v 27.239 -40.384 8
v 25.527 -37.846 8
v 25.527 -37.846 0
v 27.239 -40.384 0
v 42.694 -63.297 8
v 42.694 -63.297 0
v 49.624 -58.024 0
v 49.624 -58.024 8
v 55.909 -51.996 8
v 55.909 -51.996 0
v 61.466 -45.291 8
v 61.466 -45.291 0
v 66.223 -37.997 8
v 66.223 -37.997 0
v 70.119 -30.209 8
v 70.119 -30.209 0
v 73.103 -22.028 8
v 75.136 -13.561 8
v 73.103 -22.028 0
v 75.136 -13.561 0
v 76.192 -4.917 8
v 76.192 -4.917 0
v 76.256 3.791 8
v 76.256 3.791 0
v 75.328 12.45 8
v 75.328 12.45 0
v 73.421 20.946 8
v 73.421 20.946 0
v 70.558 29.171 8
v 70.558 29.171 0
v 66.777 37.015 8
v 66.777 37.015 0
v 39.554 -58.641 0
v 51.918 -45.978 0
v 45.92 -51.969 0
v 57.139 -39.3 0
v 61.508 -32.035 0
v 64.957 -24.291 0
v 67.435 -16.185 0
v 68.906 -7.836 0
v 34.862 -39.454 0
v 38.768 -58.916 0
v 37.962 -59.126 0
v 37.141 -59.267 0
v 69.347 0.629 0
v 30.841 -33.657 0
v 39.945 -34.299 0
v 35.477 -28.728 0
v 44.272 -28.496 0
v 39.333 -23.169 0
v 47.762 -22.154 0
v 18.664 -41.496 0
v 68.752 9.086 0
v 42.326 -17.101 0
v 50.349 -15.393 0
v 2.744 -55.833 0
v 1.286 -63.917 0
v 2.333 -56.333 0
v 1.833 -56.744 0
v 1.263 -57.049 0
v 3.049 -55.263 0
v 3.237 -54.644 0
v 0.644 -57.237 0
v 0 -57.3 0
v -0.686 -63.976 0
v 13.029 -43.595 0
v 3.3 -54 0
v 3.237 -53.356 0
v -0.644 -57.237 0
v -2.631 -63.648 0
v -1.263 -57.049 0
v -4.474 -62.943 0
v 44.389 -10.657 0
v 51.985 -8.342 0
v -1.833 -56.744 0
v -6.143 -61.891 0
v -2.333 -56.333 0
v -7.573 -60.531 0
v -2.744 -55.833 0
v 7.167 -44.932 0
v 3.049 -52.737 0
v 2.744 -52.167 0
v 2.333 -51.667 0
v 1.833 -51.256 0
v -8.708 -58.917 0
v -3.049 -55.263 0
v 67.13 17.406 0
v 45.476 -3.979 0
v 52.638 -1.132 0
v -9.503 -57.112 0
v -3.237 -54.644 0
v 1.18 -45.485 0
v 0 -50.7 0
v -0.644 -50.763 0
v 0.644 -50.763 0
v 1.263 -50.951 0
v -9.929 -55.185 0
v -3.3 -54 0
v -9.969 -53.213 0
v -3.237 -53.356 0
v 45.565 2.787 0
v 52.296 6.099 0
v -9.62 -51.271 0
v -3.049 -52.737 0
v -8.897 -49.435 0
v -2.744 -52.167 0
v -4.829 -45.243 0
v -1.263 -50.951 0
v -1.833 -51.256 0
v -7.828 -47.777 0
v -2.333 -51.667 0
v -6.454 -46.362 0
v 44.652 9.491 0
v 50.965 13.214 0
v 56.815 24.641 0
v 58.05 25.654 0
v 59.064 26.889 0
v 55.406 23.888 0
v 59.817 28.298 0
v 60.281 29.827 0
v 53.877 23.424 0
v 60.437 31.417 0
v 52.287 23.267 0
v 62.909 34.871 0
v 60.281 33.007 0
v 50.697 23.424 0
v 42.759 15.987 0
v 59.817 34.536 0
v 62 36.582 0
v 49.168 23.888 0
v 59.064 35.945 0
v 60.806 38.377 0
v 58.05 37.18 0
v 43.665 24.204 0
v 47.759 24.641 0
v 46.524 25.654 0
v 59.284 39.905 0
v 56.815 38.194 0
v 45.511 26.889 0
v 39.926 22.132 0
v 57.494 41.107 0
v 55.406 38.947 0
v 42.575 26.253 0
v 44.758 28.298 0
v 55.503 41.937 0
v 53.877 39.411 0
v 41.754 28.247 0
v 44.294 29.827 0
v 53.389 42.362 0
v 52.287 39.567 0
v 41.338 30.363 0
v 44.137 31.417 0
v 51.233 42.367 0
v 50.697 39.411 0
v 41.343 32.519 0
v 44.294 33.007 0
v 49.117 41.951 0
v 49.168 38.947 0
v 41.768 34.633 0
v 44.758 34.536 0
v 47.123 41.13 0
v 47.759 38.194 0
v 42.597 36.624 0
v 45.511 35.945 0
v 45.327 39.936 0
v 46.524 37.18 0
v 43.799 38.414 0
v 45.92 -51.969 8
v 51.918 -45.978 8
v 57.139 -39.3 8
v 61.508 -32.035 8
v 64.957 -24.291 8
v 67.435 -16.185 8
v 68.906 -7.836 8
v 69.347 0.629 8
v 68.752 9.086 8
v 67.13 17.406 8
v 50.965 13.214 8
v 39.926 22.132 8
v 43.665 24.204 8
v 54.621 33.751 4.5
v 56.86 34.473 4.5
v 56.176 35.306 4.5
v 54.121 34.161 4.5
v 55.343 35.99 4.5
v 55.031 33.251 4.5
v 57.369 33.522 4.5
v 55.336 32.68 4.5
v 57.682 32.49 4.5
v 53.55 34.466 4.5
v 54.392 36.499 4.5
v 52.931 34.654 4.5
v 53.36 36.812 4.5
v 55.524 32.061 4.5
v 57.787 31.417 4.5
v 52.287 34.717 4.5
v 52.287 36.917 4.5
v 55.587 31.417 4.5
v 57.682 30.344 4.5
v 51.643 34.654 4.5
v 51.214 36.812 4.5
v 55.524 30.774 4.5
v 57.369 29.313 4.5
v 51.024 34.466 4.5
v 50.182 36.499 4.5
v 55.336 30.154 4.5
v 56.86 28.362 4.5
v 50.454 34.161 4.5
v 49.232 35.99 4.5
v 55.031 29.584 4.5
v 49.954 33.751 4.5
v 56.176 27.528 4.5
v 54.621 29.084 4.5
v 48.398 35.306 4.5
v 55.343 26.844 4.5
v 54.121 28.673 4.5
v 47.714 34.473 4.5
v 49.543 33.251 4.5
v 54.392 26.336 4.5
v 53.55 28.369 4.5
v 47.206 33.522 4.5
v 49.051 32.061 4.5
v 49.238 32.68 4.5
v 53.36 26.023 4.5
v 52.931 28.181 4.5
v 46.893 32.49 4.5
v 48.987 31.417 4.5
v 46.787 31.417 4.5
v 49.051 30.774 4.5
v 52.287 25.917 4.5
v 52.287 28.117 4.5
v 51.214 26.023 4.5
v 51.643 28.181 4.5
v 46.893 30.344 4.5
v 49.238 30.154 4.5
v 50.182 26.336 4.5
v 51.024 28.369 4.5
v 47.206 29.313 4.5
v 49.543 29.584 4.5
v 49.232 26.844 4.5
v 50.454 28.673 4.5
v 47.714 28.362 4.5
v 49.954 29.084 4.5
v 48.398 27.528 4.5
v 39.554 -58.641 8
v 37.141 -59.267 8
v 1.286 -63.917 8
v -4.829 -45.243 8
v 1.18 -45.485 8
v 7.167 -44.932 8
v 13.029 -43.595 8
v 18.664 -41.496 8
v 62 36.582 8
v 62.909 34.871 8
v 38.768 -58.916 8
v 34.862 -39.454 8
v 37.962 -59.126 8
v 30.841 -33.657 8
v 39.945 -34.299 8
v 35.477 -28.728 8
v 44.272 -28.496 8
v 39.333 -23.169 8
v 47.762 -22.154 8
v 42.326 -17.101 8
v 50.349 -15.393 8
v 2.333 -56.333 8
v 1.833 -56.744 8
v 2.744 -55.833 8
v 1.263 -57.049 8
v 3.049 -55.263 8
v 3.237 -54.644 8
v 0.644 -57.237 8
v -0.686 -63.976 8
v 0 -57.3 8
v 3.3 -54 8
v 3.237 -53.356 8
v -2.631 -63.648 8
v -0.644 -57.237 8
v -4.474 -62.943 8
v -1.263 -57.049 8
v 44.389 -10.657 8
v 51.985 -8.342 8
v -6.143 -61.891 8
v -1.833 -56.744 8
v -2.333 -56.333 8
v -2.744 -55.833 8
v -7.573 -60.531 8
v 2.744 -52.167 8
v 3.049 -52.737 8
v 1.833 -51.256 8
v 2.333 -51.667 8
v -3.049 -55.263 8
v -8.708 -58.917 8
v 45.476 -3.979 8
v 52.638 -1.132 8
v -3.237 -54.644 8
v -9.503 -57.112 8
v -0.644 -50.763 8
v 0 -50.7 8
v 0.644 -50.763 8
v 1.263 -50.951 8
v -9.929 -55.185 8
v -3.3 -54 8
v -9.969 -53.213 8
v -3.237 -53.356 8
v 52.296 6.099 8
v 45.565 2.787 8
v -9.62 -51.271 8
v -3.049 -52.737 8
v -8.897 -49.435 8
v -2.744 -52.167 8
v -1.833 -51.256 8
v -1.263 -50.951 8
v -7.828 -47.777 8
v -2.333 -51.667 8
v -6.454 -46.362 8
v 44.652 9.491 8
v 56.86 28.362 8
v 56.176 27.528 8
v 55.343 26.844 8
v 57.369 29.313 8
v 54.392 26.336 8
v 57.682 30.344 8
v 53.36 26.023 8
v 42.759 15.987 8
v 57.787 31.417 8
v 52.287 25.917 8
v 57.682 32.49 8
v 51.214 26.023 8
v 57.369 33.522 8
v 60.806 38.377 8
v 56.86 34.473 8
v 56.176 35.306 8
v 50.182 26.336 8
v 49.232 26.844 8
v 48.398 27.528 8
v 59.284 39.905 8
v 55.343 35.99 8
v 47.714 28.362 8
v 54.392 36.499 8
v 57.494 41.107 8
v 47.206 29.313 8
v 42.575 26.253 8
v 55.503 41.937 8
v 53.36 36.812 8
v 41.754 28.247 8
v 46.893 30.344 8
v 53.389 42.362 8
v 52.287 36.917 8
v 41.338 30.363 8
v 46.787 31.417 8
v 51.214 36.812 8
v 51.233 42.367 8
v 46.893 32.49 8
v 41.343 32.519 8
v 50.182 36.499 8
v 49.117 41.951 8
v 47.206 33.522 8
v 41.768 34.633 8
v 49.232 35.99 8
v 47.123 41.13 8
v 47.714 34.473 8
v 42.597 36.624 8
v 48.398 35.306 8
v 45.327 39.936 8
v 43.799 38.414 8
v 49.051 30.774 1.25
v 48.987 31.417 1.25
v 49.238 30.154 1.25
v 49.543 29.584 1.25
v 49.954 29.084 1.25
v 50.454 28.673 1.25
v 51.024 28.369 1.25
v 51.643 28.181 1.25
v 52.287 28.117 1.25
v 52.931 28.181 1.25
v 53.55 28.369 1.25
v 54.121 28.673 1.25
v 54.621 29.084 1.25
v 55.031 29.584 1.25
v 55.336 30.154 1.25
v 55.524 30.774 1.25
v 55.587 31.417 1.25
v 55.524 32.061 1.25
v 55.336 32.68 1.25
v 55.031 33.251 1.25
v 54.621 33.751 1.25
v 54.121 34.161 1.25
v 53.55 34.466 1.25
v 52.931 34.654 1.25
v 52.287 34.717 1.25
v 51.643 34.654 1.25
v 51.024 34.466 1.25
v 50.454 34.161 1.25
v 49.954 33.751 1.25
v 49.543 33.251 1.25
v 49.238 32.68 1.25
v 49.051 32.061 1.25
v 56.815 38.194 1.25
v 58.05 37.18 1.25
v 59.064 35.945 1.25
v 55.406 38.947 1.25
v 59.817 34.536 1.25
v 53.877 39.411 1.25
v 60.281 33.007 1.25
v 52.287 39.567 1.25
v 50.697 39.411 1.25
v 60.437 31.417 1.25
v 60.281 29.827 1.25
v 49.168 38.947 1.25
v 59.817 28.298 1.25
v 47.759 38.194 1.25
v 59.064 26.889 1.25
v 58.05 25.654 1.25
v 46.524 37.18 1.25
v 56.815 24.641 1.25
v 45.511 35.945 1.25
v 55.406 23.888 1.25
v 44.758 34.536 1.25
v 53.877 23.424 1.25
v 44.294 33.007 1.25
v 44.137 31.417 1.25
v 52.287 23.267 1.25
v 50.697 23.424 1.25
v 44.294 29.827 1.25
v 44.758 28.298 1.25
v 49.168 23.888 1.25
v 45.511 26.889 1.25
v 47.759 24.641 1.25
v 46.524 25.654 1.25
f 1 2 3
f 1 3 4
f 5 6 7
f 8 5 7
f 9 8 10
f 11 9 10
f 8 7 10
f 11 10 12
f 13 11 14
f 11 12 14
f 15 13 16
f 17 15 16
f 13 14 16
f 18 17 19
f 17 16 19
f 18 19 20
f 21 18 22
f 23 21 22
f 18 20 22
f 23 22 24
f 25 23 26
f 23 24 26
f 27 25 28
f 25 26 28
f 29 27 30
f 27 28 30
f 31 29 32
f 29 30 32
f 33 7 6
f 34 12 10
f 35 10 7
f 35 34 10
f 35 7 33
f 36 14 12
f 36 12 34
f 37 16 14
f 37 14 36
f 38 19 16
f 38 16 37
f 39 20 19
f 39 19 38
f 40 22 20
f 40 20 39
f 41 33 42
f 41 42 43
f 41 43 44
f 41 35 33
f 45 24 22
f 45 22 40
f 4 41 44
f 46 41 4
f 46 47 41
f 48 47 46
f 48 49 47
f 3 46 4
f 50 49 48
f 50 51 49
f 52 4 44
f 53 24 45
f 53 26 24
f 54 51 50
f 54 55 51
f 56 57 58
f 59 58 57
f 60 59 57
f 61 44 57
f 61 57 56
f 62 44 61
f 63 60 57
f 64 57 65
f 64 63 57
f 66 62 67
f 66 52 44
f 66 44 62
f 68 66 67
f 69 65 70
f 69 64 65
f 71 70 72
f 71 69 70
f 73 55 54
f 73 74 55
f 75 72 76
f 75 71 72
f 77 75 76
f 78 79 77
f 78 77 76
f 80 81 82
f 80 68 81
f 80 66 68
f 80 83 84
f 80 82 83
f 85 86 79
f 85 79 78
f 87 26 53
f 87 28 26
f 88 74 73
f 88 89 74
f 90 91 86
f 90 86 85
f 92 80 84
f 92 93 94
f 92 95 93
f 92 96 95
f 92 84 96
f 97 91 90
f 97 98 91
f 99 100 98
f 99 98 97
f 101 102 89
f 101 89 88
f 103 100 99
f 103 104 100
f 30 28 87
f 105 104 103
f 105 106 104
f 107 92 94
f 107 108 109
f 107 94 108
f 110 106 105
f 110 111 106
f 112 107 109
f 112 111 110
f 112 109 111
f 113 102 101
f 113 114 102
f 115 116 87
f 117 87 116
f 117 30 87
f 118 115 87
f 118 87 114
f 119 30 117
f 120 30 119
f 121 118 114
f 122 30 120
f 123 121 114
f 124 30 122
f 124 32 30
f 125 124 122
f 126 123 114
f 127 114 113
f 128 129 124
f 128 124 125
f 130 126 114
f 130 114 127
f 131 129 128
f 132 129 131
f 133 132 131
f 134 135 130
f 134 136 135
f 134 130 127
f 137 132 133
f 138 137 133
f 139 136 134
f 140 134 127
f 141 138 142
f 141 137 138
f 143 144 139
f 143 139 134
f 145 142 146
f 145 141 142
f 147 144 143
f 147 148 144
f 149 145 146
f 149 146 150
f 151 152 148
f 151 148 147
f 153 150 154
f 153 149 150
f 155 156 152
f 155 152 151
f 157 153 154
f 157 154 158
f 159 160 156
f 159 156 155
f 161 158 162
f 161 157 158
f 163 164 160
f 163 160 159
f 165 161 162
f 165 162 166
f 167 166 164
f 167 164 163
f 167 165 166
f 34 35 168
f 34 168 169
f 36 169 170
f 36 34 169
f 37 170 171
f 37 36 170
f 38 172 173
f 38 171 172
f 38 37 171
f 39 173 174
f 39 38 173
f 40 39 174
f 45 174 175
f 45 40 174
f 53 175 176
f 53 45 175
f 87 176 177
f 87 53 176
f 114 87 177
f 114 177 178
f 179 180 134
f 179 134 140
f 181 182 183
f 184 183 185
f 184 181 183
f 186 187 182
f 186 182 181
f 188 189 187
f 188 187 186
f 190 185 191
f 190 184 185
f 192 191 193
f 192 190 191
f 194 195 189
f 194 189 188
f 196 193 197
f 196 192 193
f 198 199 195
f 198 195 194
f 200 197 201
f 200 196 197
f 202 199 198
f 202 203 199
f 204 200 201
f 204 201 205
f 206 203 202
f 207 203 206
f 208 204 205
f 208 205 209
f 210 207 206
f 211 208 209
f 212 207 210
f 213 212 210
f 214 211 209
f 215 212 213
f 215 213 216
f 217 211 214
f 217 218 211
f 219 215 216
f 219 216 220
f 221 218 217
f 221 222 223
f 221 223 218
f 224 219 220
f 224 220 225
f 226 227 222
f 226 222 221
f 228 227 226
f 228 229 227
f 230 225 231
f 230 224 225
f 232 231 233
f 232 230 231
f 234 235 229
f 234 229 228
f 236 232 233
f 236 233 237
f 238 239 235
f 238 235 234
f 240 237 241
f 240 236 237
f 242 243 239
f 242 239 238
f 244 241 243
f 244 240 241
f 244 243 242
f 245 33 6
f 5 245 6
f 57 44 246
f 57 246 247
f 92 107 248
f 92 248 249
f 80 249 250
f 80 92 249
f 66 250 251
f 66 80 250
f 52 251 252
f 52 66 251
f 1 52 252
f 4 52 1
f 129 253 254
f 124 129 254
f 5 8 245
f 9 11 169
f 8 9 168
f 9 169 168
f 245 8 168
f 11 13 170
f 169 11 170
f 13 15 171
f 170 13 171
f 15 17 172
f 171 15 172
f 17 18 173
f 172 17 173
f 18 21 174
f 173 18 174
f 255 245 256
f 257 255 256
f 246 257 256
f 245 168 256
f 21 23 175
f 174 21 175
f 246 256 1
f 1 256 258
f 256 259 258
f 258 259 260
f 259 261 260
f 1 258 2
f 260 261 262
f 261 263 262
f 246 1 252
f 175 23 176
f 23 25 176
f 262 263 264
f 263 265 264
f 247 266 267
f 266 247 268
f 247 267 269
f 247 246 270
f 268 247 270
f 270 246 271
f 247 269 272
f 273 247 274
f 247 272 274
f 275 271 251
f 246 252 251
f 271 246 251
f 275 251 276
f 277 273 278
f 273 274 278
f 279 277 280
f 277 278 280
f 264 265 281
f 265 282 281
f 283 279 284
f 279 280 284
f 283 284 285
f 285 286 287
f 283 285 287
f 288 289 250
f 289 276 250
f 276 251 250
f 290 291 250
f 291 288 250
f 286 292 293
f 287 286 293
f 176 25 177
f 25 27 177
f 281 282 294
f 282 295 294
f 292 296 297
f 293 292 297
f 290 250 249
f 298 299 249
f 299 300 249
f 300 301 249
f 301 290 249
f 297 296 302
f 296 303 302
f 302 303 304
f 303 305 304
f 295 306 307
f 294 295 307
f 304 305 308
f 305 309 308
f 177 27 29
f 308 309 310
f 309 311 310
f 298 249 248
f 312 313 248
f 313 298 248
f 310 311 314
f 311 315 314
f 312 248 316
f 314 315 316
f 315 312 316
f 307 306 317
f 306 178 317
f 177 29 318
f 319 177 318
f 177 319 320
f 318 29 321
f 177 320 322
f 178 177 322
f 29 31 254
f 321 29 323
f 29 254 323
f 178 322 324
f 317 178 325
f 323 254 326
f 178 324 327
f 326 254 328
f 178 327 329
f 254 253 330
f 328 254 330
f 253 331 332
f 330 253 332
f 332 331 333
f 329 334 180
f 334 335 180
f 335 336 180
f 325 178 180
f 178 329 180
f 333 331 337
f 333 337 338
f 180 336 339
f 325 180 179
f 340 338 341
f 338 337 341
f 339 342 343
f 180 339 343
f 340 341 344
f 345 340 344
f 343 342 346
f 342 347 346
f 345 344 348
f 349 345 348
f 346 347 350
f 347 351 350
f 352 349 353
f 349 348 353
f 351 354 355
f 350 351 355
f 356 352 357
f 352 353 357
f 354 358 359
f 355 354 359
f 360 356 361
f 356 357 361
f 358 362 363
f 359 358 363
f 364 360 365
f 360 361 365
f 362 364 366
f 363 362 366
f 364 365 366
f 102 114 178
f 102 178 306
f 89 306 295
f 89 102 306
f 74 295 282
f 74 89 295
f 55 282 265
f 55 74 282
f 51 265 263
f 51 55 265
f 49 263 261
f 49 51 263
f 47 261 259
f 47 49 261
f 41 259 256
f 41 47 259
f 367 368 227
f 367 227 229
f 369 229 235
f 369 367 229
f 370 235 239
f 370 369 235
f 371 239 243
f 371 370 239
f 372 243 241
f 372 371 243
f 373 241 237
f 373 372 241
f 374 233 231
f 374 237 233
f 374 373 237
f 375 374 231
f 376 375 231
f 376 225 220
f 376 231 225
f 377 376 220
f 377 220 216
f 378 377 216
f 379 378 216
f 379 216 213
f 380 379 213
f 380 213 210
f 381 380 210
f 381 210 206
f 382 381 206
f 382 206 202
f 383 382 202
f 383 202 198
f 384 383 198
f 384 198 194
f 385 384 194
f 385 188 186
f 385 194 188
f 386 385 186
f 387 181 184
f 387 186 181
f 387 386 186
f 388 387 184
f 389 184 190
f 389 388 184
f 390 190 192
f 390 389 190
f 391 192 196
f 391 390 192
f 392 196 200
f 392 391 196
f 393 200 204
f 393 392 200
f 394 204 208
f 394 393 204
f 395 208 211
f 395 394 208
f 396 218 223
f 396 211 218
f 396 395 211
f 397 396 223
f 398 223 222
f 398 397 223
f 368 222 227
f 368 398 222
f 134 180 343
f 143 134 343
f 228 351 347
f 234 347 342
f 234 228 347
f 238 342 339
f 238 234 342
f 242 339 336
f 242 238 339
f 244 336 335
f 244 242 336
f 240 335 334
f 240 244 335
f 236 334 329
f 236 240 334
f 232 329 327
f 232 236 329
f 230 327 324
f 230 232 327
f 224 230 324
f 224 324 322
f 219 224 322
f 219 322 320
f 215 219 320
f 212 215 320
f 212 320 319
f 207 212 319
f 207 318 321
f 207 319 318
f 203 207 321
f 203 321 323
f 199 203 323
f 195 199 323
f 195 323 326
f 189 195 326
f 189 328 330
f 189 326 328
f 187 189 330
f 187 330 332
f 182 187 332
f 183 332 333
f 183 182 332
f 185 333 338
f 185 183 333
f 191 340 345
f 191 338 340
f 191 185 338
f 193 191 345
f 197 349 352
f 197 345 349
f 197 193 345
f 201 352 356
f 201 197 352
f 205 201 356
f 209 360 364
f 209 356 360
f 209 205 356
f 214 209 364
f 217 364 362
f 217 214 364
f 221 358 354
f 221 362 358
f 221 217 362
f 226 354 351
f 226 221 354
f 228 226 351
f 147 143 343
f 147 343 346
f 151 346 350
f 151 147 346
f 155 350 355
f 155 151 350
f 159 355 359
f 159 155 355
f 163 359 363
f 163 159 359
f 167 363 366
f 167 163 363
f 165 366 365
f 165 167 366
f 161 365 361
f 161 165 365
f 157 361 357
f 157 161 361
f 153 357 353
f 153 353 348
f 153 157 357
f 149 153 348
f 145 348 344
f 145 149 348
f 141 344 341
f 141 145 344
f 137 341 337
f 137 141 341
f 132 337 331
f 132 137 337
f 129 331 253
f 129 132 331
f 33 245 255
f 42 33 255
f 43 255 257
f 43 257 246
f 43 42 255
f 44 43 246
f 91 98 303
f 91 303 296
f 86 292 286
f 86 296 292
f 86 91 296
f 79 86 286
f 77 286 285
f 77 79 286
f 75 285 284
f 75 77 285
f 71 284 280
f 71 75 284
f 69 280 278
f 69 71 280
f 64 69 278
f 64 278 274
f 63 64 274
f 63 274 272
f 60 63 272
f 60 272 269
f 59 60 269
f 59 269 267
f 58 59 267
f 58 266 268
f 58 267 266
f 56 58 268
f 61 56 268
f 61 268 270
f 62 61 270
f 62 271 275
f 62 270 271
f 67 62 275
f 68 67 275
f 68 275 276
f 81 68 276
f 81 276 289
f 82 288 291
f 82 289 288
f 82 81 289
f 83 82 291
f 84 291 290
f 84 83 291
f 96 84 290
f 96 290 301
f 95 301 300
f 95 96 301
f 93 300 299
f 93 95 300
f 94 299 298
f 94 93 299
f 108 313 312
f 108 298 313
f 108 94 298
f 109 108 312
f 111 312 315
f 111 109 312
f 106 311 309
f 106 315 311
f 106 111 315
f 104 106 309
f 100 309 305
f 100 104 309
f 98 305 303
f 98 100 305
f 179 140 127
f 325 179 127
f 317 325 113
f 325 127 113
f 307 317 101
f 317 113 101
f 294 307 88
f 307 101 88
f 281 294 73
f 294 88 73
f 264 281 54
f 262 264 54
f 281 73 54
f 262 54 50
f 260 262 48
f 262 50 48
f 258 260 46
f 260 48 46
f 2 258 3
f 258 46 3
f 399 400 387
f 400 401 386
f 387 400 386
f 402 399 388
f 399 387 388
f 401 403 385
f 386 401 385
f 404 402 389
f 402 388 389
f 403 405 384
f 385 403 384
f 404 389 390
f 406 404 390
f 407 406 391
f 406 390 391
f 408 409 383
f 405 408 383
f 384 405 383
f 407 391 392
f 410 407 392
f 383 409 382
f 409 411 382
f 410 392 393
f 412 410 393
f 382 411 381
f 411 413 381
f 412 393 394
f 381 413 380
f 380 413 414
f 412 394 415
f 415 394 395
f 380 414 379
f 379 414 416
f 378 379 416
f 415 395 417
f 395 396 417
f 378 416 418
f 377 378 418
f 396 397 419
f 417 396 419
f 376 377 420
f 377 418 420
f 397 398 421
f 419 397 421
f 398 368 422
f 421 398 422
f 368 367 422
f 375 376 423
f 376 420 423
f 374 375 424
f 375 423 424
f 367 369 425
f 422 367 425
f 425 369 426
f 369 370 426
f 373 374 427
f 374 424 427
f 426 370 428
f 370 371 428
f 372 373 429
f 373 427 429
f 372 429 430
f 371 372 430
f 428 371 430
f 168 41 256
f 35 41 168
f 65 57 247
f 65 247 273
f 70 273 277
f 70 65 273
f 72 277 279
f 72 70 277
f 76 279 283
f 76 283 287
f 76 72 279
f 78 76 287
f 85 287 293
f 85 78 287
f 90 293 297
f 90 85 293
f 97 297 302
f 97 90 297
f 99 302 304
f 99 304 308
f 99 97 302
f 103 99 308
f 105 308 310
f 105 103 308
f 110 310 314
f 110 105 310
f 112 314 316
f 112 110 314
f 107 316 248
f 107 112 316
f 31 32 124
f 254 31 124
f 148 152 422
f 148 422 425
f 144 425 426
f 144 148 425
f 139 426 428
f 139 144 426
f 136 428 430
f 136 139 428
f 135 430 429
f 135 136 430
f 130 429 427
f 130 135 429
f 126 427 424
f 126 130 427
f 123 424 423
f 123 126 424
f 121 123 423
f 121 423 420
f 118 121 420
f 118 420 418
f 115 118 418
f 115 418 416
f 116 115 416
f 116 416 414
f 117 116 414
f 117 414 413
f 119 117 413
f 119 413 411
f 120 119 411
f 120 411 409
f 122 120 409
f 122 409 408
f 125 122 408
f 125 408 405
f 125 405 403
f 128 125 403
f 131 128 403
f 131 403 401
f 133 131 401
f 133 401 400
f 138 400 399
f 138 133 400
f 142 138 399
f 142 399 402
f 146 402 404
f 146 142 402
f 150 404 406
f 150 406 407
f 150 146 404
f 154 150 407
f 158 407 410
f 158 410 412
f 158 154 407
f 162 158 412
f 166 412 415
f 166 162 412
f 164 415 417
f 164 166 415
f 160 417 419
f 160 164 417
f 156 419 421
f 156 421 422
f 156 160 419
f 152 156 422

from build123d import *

# Parameters (mm, degrees)
F_01_EIGHT_MILLIMETRE_TRACK_BLANK_DEPTH        = 8
F_02_LOWER_CAGE_TIE_LANDING_DEPTH              = 8
F_03_BUMP_END_SUPPORT_LANDING_DEPTH            = 8
F_04_START                                     = -0.1
S04_RELIEF_FOR_THE_SWEPT_FLOATING_GUID_R       = 45.5
F_04_RELIEF_FOR_THE_SWEPT_FLOATING_GUIDE_DEPTH = 8.2
F_05_START                                     = -0.1
F_05_CONCENTRIC_GUIDE_AND_TANGENT_STOP_F_DEPTH = 8.2
F_06_START                                     = -0.1
S06_SUPPORT_FASTENERS_R                        = 3.3
F_06_SUPPORT_FASTENERS_DEPTH                   = 8.2
F_07_START                                     = -0.1
S07_BUMP_END_SUPPORT_REGISTER_UNDERSID_R       = 5.06
F_07_BUMP_END_SUPPORT_REGISTER_UNDERSIDE_DEPTH = 1.35
F_08_START                                     = 4.5
S08_FLUSH_BUTTON_SCREW_COUNTERBORE_OUT_R       = 5.5
F_08_FLUSH_BUTTON_SCREW_COUNTERBORE_OUTB_DEPTH = 3.6
F_01_START                                     = -0.1
S01_FULL_DIAMETER_LOCATING_SEAT_FOR_PR_R       = 8.15
F_01_FULL_DIAMETER_LOCATING_SEAT_FOR_PRI_DEPTH = 1.35


with BuildPart() as part:
    # S01 - Eight millimetre track blank → 01 - Eight millimetre track blank (new body)
    with BuildSketch(Plane.XY):
        with BuildLine():
            Line((25.527156043, -37.845565187), (42.69437818, -63.297018665))
            ThreePointArc((42.69437818, -63.297018665), (74.240443422, -17.82355353), (66.77721464, 37.015214506))
            Line((66.77721464, 37.015214506), (39.926389631, 22.131559164))
            ThreePointArc((39.926389631, 22.131559164), (44.388686866, -10.65678086), (25.527156043, -37.845565187))
        make_face()
    extrude(amount=F_01_EIGHT_MILLIMETRE_TRACK_BLANK_DEPTH)

    # S02 - Lower cage tie landing → 02 - Lower cage tie landing (add)
    with BuildSketch(Plane.XY):
        with BuildLine():
            Line((-1.286113116, -44.083049206), (34.568787274, -39.433085863))
            ThreePointArc((34.568787274, -39.433085863), (45.771851184, -48.063923541), (37.141013506, -59.266987451))
            Line((37.141013506, -59.266987451), (1.286113116, -63.916950794))
            ThreePointArc((1.286113116, -63.916950794), (-9.916950794, -55.286113116), (-1.286113116, -44.083049206))
        make_face()
    extrude(amount=F_02_LOWER_CAGE_TIE_LANDING_DEPTH)

    # S03 - Bump end support landing → 03 - Bump end support landing (add)
    with BuildSketch(Plane.XY):
        with BuildLine():
            Line((45.572351488, 20.615526776), (42.574781821, 26.253135379))
            ThreePointArc((42.574781821, 26.253135379), (47.123018152, 41.129746091), (61.999628864, 36.58150976))
            Line((61.999628864, 36.58150976), (64.997198531, 30.943901157))
            ThreePointArc((64.997198531, 30.943901157), (60.4489622, 16.067290445), (45.572351488, 20.615526776))
        make_face()
    extrude(amount=F_03_BUMP_END_SUPPORT_LANDING_DEPTH)

    # S04 - Relief for the swept floating guide barrels → 04 - Relief for the swept floating guide barrels (cut)
    with BuildSketch(Plane.XY.offset(F_04_START)):
        Circle(S04_RELIEF_FOR_THE_SWEPT_FLOATING_GUID_R)
    extrude(amount=F_04_RELIEF_FOR_THE_SWEPT_FLOATING_GUIDE_DEPTH, mode=Mode.SUBTRACT)

    # S05 - Concentric guide and tangent stop faces → 05 - Concentric guide and tangent stop faces (cut)
    with BuildSketch(Plane.XY.offset(F_05_START)):
        with BuildLine():
            Line((34.862224899, -39.454375867), (45.92013859, -51.968869257))
            ThreePointArc((45.92013859, -51.968869257), (66.319734826, -20.275977723), (67.130143118, 17.405929591))
            Line((67.130143118, 17.405929591), (50.9647013, 13.214451233))
            ThreePointArc((50.9647013, 13.214451233), (50.349445401, -15.393370254), (34.862224899, -39.454375867))
        make_face()
    extrude(amount=F_05_CONCENTRIC_GUIDE_AND_TANGENT_STOP_F_DEPTH, mode=Mode.SUBTRACT)

    # S06 - Support fasteners → 06 - Support fasteners (cut)
    with BuildSketch(Plane.XY.offset(F_06_START)):
        with Locations(Location((0, -54, 0), (0, 0, 180))):
            Circle(S06_SUPPORT_FASTENERS_R)
        with Locations(Location((52.287205343, 31.41732257, 0), (0, 0, 180))):
            Circle(S06_SUPPORT_FASTENERS_R)
    extrude(amount=F_06_SUPPORT_FASTENERS_DEPTH, mode=Mode.SUBTRACT)

    # S07 - Bump end support register underside → 07 - Bump end support register underside (cut)
    with BuildSketch(Plane.XY.offset(F_07_START)):
        with Locations(Location((52.287205343, 31.41732257, 0), (0, 0, 180))):
            Circle(S07_BUMP_END_SUPPORT_REGISTER_UNDERSID_R)
    extrude(amount=F_07_BUMP_END_SUPPORT_REGISTER_UNDERSIDE_DEPTH, mode=Mode.SUBTRACT)

    # S08 - Flush button screw counterbore outboard → 08 - Flush button screw counterbore outboard (cut)
    with BuildSketch(Plane.XY.offset(F_08_START)):
        with Locations(Location((52.287205343, 31.41732257, 0), (0, 0, 180))):
            Circle(S08_FLUSH_BUTTON_SCREW_COUNTERBORE_OUT_R)
    extrude(amount=F_08_FLUSH_BUTTON_SCREW_COUNTERBORE_OUTB_DEPTH, mode=Mode.SUBTRACT)

    # S01 - Full diameter locating seat for printed post → 01 - Full diameter locating seat for printed post (cut)
    with BuildSketch(Plane.XY.offset(F_01_START)):
        with Locations(Location((52.287205346, 31.41732257, 0), (0, 0, 180))):
            Circle(S01_FULL_DIAMETER_LOCATING_SEAT_FOR_PR_R)
    extrude(amount=F_01_FULL_DIAMETER_LOCATING_SEAT_FOR_PRI_DEPTH, mode=Mode.SUBTRACT)


solid = part.part
